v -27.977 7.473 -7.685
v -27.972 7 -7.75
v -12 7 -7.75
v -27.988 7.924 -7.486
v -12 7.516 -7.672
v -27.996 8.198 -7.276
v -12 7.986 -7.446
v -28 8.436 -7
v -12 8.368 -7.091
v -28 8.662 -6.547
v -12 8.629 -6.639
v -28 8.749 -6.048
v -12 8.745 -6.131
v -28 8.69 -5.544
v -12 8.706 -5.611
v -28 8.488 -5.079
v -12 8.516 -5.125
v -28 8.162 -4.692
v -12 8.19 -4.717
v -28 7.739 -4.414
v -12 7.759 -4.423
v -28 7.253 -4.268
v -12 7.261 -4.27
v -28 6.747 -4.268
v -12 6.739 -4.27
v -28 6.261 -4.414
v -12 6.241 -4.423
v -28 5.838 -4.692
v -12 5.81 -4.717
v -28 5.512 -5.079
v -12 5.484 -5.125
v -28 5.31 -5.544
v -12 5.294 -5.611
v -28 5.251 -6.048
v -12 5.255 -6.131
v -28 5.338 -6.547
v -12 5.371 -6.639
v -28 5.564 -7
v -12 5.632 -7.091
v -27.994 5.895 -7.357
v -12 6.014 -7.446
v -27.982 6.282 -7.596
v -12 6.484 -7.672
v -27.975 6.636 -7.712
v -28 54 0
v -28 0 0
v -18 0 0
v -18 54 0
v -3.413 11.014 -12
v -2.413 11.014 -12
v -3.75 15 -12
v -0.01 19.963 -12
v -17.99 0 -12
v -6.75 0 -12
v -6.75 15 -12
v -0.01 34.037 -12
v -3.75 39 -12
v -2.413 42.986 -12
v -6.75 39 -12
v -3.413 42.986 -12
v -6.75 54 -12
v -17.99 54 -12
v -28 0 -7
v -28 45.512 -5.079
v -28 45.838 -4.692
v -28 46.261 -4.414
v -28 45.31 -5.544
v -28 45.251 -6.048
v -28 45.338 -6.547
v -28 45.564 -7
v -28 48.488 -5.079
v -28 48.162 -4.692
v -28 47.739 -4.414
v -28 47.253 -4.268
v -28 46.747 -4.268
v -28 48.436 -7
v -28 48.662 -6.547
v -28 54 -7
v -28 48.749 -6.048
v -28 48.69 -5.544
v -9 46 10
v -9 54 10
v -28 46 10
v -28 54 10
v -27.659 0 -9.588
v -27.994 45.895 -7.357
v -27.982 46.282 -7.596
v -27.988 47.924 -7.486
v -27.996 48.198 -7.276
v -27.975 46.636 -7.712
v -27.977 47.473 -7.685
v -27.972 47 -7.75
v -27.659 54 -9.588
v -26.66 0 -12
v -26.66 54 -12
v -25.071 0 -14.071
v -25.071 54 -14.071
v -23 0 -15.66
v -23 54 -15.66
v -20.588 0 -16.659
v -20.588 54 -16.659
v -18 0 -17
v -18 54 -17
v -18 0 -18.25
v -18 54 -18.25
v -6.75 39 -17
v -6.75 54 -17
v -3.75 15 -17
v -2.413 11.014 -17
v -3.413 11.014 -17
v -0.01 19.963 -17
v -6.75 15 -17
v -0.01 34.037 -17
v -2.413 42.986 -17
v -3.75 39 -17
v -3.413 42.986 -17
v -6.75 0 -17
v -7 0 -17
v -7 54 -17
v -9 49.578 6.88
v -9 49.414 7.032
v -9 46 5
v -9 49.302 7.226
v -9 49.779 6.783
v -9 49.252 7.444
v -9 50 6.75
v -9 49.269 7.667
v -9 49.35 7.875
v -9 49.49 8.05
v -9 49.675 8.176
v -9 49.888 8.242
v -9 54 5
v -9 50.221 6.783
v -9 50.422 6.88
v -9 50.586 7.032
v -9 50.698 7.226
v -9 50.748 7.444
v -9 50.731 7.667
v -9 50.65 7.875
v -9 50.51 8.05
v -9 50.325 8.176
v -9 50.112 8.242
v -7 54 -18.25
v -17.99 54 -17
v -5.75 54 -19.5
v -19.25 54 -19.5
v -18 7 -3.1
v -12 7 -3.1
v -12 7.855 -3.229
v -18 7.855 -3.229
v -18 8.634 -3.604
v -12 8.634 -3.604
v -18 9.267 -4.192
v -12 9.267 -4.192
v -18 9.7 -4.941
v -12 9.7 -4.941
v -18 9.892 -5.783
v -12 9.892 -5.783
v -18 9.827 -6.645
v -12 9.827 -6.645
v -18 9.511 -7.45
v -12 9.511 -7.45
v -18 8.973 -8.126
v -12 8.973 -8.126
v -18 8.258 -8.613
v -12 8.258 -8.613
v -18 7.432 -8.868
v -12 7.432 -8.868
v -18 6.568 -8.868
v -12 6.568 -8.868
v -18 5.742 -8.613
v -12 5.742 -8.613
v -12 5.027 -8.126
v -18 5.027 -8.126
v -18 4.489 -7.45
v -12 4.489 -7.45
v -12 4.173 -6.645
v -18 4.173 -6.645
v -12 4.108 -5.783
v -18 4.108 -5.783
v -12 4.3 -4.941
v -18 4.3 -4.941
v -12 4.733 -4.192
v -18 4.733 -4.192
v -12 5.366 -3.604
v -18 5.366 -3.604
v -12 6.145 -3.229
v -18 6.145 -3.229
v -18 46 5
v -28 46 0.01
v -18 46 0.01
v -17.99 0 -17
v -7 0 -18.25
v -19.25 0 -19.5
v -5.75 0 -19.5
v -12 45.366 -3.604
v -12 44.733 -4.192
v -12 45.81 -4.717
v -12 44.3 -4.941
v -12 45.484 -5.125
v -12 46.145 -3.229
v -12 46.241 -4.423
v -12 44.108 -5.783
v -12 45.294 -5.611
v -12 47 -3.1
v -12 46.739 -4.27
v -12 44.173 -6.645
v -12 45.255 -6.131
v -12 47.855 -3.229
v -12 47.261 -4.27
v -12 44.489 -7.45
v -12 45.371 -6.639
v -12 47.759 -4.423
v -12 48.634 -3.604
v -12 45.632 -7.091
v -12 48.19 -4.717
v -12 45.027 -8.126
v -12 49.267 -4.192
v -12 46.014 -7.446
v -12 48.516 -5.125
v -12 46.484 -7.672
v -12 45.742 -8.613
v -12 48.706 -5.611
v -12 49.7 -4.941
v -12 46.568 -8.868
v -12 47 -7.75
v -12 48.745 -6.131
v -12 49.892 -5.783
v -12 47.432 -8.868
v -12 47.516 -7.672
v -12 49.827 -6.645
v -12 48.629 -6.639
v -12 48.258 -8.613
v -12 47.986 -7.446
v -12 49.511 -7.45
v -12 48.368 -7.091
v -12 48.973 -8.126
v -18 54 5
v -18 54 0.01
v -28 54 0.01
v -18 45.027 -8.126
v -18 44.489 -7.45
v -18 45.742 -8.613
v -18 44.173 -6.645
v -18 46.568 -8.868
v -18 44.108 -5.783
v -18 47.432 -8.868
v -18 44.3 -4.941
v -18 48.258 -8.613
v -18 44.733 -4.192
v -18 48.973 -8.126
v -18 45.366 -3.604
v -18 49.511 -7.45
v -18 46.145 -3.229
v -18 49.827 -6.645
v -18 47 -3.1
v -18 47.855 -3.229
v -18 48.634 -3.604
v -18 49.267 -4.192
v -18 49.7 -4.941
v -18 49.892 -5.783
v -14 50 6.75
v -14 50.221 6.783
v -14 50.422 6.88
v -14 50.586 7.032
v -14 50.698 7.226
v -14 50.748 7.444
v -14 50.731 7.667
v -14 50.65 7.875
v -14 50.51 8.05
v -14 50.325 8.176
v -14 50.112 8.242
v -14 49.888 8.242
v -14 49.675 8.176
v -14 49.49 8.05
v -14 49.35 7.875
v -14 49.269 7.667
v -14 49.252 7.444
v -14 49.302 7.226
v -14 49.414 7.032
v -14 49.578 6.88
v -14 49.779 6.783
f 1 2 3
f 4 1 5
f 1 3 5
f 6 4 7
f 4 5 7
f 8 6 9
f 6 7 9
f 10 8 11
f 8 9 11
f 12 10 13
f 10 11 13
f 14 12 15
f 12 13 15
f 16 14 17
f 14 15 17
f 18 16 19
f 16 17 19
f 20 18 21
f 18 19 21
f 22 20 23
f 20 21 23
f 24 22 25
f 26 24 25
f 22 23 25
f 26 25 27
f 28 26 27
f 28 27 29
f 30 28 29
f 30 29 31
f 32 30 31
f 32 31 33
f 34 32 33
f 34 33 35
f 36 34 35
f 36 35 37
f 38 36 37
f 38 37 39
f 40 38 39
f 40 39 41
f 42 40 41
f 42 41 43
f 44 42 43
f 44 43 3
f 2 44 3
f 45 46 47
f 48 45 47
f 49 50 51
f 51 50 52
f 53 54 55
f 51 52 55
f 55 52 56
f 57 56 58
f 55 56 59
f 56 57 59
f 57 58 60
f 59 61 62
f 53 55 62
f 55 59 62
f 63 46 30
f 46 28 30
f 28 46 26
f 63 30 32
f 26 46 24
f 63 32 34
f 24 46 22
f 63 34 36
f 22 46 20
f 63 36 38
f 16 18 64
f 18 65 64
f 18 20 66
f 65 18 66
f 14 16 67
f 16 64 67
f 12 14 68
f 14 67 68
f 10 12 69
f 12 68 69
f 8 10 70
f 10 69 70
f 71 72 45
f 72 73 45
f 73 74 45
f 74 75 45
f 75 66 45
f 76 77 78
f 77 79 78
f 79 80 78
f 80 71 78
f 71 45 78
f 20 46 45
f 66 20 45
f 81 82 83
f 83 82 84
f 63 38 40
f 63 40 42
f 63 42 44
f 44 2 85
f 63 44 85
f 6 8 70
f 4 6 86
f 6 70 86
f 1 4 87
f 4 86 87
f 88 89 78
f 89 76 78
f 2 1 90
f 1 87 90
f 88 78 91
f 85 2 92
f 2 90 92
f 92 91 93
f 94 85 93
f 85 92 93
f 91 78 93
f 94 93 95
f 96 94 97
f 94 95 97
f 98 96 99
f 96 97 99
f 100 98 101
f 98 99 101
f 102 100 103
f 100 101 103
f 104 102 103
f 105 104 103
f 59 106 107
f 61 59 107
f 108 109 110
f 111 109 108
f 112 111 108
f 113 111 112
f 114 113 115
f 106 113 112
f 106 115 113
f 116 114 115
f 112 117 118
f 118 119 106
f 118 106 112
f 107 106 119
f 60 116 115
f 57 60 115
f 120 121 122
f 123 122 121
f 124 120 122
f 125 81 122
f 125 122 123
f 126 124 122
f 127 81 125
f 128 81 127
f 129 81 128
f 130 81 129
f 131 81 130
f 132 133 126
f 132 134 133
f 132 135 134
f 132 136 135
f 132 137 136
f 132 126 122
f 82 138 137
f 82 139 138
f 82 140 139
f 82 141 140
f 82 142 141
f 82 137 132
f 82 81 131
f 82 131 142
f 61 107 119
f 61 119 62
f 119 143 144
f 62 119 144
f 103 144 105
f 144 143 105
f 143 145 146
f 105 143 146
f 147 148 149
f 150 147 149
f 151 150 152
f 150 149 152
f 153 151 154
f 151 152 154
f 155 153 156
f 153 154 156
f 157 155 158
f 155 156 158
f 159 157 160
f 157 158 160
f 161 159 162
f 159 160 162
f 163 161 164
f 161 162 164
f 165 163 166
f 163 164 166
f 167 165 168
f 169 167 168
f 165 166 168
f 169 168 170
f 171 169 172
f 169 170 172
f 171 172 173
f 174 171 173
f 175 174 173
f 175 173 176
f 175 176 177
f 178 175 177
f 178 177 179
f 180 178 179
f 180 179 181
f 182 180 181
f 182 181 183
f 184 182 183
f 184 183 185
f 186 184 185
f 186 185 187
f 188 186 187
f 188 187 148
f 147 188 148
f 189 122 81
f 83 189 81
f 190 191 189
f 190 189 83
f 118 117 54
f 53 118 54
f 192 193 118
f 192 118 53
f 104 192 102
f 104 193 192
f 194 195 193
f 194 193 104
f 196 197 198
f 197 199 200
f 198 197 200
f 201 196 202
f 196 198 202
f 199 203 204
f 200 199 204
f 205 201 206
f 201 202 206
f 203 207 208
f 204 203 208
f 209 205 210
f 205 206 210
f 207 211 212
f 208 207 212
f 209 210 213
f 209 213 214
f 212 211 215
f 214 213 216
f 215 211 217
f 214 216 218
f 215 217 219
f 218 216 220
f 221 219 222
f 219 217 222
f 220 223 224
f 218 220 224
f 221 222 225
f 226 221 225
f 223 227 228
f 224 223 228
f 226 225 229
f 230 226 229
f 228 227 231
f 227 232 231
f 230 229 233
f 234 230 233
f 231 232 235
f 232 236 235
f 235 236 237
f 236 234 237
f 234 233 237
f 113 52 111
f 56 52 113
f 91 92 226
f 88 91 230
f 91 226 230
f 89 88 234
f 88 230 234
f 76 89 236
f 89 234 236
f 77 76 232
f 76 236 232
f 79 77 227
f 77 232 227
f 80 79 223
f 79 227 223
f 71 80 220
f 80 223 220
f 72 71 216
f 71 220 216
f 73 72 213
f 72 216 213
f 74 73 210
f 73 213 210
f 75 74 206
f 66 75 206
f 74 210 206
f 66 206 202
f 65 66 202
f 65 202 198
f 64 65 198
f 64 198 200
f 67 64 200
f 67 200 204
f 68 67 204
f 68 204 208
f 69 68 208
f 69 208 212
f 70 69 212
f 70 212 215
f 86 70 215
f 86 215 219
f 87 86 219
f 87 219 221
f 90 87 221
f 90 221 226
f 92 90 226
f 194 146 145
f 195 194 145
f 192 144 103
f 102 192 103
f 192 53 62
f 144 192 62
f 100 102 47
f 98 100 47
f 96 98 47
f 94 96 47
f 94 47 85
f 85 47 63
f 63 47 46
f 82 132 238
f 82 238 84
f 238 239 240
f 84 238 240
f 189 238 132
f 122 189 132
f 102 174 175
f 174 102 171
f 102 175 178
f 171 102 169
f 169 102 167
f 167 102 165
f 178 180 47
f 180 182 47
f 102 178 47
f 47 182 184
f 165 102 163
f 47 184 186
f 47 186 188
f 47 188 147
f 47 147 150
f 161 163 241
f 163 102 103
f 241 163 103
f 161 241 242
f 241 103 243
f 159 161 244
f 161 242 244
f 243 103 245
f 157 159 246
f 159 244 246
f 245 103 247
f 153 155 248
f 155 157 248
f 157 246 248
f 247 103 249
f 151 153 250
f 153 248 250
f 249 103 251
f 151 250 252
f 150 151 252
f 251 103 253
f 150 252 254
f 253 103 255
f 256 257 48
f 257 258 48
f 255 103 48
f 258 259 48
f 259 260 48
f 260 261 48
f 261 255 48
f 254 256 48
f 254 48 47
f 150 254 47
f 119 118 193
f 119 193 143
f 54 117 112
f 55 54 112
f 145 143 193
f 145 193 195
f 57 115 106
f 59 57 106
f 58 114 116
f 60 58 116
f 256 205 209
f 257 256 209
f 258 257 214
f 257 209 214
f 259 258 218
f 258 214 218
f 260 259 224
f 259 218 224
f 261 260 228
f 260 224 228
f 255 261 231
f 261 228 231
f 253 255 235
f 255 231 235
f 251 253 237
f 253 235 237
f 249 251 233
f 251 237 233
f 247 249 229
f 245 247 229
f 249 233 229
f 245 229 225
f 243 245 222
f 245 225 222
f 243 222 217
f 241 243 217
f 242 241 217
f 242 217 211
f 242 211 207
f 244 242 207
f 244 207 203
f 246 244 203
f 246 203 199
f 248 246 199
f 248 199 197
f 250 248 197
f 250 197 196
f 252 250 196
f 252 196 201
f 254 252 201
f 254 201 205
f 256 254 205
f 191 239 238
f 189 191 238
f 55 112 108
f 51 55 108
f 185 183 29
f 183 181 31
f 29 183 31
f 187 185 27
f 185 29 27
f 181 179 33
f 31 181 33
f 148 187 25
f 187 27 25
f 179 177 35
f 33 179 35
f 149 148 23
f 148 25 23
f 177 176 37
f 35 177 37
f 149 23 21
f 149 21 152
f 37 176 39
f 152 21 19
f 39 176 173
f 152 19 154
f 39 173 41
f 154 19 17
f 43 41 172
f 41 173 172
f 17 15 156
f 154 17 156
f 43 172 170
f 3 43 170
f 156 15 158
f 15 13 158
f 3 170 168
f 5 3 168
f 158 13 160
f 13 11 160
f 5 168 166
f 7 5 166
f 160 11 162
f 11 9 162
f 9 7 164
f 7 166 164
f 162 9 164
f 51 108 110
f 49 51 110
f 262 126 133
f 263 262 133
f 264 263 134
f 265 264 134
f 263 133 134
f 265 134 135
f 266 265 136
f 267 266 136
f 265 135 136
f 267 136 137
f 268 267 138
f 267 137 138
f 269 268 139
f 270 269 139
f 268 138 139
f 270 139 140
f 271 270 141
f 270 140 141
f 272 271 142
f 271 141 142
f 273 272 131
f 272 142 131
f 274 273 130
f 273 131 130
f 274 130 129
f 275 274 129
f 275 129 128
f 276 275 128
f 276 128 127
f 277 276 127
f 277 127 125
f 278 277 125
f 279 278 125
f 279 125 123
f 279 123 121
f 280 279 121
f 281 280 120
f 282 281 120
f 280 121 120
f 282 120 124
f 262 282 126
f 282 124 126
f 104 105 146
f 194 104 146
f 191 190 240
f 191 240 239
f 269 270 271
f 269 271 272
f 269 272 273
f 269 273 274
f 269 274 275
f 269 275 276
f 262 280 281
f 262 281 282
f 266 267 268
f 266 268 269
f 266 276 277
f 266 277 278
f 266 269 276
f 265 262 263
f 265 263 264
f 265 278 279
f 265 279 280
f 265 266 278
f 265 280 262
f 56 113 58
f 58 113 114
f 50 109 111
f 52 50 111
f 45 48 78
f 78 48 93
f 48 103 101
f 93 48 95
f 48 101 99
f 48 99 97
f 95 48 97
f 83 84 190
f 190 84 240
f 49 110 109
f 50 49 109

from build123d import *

# Parameters (mm, degrees)
SKETCH1_W           = 12
SKETCH1_H           = 54
BOSS_EXTRUDE1_DEPTH = 10
SKETCH2_R           = 2.9
BOSS_EXTRUDE2_DEPTH = 18
SKETCH3_W           = 12
SKETCH3_H           = 54
BOSS_EXTRUDE3_DEPTH = 10
SKETCH4_R           = 1.75
CUT_EXTRUDE1_DEPTH  = 50
SKETCH5_W           = 38
SKETCH5_H           = 54
BOSS_EXTRUDE4_DEPTH = 5
FILLET1_R           = 10
SKETCH6_W           = 6
SKETCH6_H           = 54
CUT_EXTRUDE2_DEPTH  = 15
SKETCH7_W           = 0.01
SKETCH7_H           = 54
CUT_EXTRUDE3_DEPTH  = 12.5
BOSS_EXTRUDE5_DEPTH = 8
SKETCH9_W           = 38
SKETCH9_H           = 0.01
CUT_EXTRUDE4_DEPTH  = 50
SKETCH10_W          = 11
SKETCH10_H          = 54
BOSS_EXTRUDE6_DEPTH = 2.5
BOSS_EXTRUDE7_DEPTH = 54
CUT_EXTRUDE5_DEPTH  = 5
SKETCH14_W          = 32.887251504
SKETCH14_H          = 59.683223859
CUT_EXTRUDE6_DEPTH  = 22
SKETCH15_R          = 0.75
CUT_EXTRUDE7_DEPTH  = 5


with BuildPart() as part:
    # Sketch1 → Boss-Extrude1 (new body)
    with BuildSketch(Plane(origin=(0, 0, 0), x_dir=(0, 0, -1), z_dir=(1, 0, 0))):
        with Locations((6, 27)):
            Rectangle(SKETCH1_W, SKETCH1_H)
    extrude(amount=BOSS_EXTRUDE1_DEPTH)

    # Sketch2 → Boss-Extrude2 (add)
    with BuildSketch(Plane.ZY):
        with Locations((-6, 47)):
            Circle(SKETCH2_R)
        with Locations((-6, 7)):
            Circle(SKETCH2_R)
    extrude(amount=BOSS_EXTRUDE2_DEPTH)

    # Sketch3 → Boss-Extrude3 (add)
    with BuildSketch(Plane.ZY.offset(18)):
        with Locations((-6, 27)):
            Rectangle(SKETCH3_W, SKETCH3_H)
    extrude(amount=BOSS_EXTRUDE3_DEPTH)

    # Sketch4 → Cut-Extrude1 (cut)
    with BuildSketch(Plane(origin=(10, 0, 0), x_dir=(0, 0, -1), z_dir=(1, 0, 0))):
        with Locations((6, 47)):
            Circle(SKETCH4_R)
        with Locations((6, 7)):
            Circle(SKETCH4_R)
    extrude(amount=-CUT_EXTRUDE1_DEPTH, mode=Mode.SUBTRACT)

    # Sketch5 → Boss-Extrude4 (add)
    with BuildSketch(Plane(origin=(0, 0, -12), x_dir=(-1, 0, 0), z_dir=(0, 0, -1))):
        with Locations((9, 27)):
            Rectangle(SKETCH5_W, SKETCH5_H)
    extrude(amount=BOSS_EXTRUDE4_DEPTH)

    # Fillet1
    # the kernel refuses this fillet: 10 mm, written as the material it takes off along each edge
    with BuildSketch(Plane(origin=(10, -25, -17), x_dir=(-1, 0, 0), z_dir=(0, 1, 0))) as fillet1_piece_1:
        with BuildLine():
            CenterArc((FILLET1_R, FILLET1_R), FILLET1_R, 180, 90)
            Line((0, FILLET1_R), (0, 0))
            Line((0, 0), (FILLET1_R, 0))
        make_face()
    extrude(amount=104, mode=Mode.SUBTRACT)
    with BuildSketch(Plane(origin=(-28, 79, -17), x_dir=(0, 0, 1), z_dir=(0, -1, 0))) as fillet1_piece_2:
        with BuildLine():
            CenterArc((FILLET1_R, -FILLET1_R), FILLET1_R, 90, 90)
            Line((0, -FILLET1_R), (0, 0))
            Line((0, 0), (FILLET1_R, 0))
        make_face()
    extrude(amount=104, mode=Mode.SUBTRACT)

    # Sketch6 → Cut-Extrude2 (cut)
    with BuildSketch(Plane.XY.offset(-12)):
        with Locations((-9, 27)):
            Rectangle(SKETCH6_W, SKETCH6_H)
    extrude(amount=CUT_EXTRUDE2_DEPTH, mode=Mode.SUBTRACT)

    # Sketch7 → Cut-Extrude3 (cut)
    with BuildSketch(Plane.XY.offset(-12)):
        with Locations((-17.995, 27)):
            Rectangle(SKETCH7_W, SKETCH7_H)
        with Locations((-0.005, 27)):
            Rectangle(SKETCH7_W, SKETCH7_H)
    extrude(amount=-CUT_EXTRUDE3_DEPTH, mode=Mode.SUBTRACT)


with BuildPart() as cut_extrude3_piece_1:
    # of the separate pieces the step leaves, piece 1, a body of its own (cut_extrude3_pieces)
    add(part.part.solids().sort_by_distance((-18, 0, 0))[0])



with BuildPart() as cut_extrude3_piece_2:
    # of the separate pieces the step leaves, piece 2, a body of its own (cut_extrude3_pieces)
    add(part.part.solids().sort_by_distance((0, 0, -17))[0])


with BuildPart() as cut_extrude3_piece_3:
    # of the separate pieces the step leaves, piece 3, a body of its own (cut_extrude3_pieces)
    add(part.part.solids().sort_by_distance((-17.99, 0, -12))[0])



with BuildPart() as cut_extrude3_piece_1_1:
    add(cut_extrude3_piece_1.part)

    add(cut_extrude3_piece_2.part)  # Boss-Extrude5 merges Cut-Extrude3 piece 2
    # Sketch8 → Boss-Extrude5 (add)
    with BuildSketch(Plane(origin=(0, 54, 0), x_dir=(1, 0, 0), z_dir=(0, 1, 0))):
        Polygon((-18, 0), (-18, -5), (0, -5), (0, 0), (10, 0), (10, -10), (-28, -10), (-28, 0), align=None)
    extrude(amount=-BOSS_EXTRUDE5_DEPTH)

    # Sketch9 → Cut-Extrude4 (cut)
    with BuildSketch(Plane.XZ.offset(-46)):
        with Locations((-9, 0.005)):
            Rectangle(SKETCH9_W, SKETCH9_H)
    extrude(amount=-CUT_EXTRUDE4_DEPTH, mode=Mode.SUBTRACT)


with BuildPart() as cut_extrude4_piece_1:
    # of the separate pieces the step leaves, piece 1, a body of its own (cut_extrude4_pieces)
    add(cut_extrude3_piece_1_1.part.solids().sort_by_distance((0, 0, -17))[0])


with BuildPart() as cut_extrude4_piece_2:
    # of the separate pieces the step leaves, piece 2, a body of its own (cut_extrude4_pieces)
    add(cut_extrude3_piece_1_1.part.solids().sort_by_distance((-18, 0, 0))[0])


with BuildPart() as cut_extrude4_piece_3:
    # of the separate pieces the step leaves, piece 3, a body of its own (cut_extrude4_pieces)
    add(cut_extrude3_piece_1_1.part.solids().sort_by_distance((0, 54, 0.01))[0])


with BuildPart() as cut_extrude3_piece_3_1:
    add(cut_extrude3_piece_3.part)

    add(cut_extrude4_piece_2.part)  # Boss-Extrude6 merges Cut-Extrude4 piece 2
    # Sketch10 → Boss-Extrude6 (add)
    with BuildSketch(Plane(origin=(0, 0, -17), x_dir=(-1, 0, 0), z_dir=(0, 0, -1))):
        with Locations((12.5, 27)):
            Rectangle(SKETCH10_W, SKETCH10_H)
    extrude(amount=BOSS_EXTRUDE6_DEPTH)

    # Sketch11 → Boss-Extrude7 (add)
    with BuildSketch(Plane(origin=(0, 54, 0), x_dir=(1, 0, 0), z_dir=(0, 1, 0))):
        Polygon((-18, 18.25), (-19.25, 19.5), (-18, 19.5), align=None)
        Polygon((-7, 19.5), (-7, 18.25), (-5.75, 19.5), align=None)
    extrude(amount=-BOSS_EXTRUDE7_DEPTH)


with BuildPart() as cut_extrude5_tool:
    # Sketch13 → Cut-Extrude5 (new body)
    with BuildSketch(Plane(origin=(0, 0, -17), x_dir=(-1, 0, 0), z_dir=(0, 0, -1))):
        Polygon((0, 34), (0.01, 54), (5.75, 54), (5.75, 57.531607605), (-24.050626329, 57.531607605), (-24.050626329, -8.302169783), (5.75, -8.302169783), (5.75, 0), (0.01, 0), (0, 20), align=None)
        Polygon((5.75, 54), (0.01, 54), (0, 34), (2.412537726, 42.985739481), (3.412537726, 42.985739481), (3.75, 39), (4.75, 39), (5.75, 39), (6.75, 39), (6.75, 54), align=None)
        Polygon((2.412537726, 11.014260519), (0, 20), (0.01, 0), (5.75, 0), (6.75, 0), (6.75, 15), (5.75, 15), (4.75, 15), (3.75, 15), (3.412537726, 11.014260519), align=None)
    extrude(amount=-CUT_EXTRUDE5_DEPTH)


with BuildPart() as cut_extrude3_piece_3_2:
    add(cut_extrude3_piece_3_1.part)

    # Cut-Extrude5: cut by cut_extrude5_tool
    add(cut_extrude5_tool.part, mode=Mode.SUBTRACT)


with BuildPart() as cut_extrude4_piece_1_1:
    add(cut_extrude4_piece_1.part)

    # Cut-Extrude5: cut by cut_extrude5_tool
    add(cut_extrude5_tool.part, mode=Mode.SUBTRACT)


with BuildPart() as cut_extrude6_tool:
    # Sketch14 → Cut-Extrude6 (new body)
    with BuildSketch(Plane.XY.offset(10)):
        with Locations((7.443625752, 24.15838807)):
            Rectangle(SKETCH14_W, SKETCH14_H)
    extrude(amount=-CUT_EXTRUDE6_DEPTH)


with BuildPart() as cut_extrude4_piece_1_2:
    add(cut_extrude4_piece_1_1.part)

    # Cut-Extrude6: cut by cut_extrude6_tool
    add(cut_extrude6_tool.part, mode=Mode.SUBTRACT)


with BuildPart() as cut_extrude4_piece_3_1:
    add(cut_extrude4_piece_3.part)

    # Cut-Extrude6: cut by cut_extrude6_tool
    add(cut_extrude6_tool.part, mode=Mode.SUBTRACT)

    # Sketch15 → Cut-Extrude7 (cut)
    with BuildSketch(Plane(origin=(-9, 0, 0), x_dir=(0, 0, -1), z_dir=(1, 0, 0))):
        with Locations((-7.5, 50)):
            Circle(SKETCH15_R)
    extrude(amount=-CUT_EXTRUDE7_DEPTH, mode=Mode.SUBTRACT)


solid = Compound([cut_extrude3_piece_3_2.part, cut_extrude4_piece_3_1.part])
